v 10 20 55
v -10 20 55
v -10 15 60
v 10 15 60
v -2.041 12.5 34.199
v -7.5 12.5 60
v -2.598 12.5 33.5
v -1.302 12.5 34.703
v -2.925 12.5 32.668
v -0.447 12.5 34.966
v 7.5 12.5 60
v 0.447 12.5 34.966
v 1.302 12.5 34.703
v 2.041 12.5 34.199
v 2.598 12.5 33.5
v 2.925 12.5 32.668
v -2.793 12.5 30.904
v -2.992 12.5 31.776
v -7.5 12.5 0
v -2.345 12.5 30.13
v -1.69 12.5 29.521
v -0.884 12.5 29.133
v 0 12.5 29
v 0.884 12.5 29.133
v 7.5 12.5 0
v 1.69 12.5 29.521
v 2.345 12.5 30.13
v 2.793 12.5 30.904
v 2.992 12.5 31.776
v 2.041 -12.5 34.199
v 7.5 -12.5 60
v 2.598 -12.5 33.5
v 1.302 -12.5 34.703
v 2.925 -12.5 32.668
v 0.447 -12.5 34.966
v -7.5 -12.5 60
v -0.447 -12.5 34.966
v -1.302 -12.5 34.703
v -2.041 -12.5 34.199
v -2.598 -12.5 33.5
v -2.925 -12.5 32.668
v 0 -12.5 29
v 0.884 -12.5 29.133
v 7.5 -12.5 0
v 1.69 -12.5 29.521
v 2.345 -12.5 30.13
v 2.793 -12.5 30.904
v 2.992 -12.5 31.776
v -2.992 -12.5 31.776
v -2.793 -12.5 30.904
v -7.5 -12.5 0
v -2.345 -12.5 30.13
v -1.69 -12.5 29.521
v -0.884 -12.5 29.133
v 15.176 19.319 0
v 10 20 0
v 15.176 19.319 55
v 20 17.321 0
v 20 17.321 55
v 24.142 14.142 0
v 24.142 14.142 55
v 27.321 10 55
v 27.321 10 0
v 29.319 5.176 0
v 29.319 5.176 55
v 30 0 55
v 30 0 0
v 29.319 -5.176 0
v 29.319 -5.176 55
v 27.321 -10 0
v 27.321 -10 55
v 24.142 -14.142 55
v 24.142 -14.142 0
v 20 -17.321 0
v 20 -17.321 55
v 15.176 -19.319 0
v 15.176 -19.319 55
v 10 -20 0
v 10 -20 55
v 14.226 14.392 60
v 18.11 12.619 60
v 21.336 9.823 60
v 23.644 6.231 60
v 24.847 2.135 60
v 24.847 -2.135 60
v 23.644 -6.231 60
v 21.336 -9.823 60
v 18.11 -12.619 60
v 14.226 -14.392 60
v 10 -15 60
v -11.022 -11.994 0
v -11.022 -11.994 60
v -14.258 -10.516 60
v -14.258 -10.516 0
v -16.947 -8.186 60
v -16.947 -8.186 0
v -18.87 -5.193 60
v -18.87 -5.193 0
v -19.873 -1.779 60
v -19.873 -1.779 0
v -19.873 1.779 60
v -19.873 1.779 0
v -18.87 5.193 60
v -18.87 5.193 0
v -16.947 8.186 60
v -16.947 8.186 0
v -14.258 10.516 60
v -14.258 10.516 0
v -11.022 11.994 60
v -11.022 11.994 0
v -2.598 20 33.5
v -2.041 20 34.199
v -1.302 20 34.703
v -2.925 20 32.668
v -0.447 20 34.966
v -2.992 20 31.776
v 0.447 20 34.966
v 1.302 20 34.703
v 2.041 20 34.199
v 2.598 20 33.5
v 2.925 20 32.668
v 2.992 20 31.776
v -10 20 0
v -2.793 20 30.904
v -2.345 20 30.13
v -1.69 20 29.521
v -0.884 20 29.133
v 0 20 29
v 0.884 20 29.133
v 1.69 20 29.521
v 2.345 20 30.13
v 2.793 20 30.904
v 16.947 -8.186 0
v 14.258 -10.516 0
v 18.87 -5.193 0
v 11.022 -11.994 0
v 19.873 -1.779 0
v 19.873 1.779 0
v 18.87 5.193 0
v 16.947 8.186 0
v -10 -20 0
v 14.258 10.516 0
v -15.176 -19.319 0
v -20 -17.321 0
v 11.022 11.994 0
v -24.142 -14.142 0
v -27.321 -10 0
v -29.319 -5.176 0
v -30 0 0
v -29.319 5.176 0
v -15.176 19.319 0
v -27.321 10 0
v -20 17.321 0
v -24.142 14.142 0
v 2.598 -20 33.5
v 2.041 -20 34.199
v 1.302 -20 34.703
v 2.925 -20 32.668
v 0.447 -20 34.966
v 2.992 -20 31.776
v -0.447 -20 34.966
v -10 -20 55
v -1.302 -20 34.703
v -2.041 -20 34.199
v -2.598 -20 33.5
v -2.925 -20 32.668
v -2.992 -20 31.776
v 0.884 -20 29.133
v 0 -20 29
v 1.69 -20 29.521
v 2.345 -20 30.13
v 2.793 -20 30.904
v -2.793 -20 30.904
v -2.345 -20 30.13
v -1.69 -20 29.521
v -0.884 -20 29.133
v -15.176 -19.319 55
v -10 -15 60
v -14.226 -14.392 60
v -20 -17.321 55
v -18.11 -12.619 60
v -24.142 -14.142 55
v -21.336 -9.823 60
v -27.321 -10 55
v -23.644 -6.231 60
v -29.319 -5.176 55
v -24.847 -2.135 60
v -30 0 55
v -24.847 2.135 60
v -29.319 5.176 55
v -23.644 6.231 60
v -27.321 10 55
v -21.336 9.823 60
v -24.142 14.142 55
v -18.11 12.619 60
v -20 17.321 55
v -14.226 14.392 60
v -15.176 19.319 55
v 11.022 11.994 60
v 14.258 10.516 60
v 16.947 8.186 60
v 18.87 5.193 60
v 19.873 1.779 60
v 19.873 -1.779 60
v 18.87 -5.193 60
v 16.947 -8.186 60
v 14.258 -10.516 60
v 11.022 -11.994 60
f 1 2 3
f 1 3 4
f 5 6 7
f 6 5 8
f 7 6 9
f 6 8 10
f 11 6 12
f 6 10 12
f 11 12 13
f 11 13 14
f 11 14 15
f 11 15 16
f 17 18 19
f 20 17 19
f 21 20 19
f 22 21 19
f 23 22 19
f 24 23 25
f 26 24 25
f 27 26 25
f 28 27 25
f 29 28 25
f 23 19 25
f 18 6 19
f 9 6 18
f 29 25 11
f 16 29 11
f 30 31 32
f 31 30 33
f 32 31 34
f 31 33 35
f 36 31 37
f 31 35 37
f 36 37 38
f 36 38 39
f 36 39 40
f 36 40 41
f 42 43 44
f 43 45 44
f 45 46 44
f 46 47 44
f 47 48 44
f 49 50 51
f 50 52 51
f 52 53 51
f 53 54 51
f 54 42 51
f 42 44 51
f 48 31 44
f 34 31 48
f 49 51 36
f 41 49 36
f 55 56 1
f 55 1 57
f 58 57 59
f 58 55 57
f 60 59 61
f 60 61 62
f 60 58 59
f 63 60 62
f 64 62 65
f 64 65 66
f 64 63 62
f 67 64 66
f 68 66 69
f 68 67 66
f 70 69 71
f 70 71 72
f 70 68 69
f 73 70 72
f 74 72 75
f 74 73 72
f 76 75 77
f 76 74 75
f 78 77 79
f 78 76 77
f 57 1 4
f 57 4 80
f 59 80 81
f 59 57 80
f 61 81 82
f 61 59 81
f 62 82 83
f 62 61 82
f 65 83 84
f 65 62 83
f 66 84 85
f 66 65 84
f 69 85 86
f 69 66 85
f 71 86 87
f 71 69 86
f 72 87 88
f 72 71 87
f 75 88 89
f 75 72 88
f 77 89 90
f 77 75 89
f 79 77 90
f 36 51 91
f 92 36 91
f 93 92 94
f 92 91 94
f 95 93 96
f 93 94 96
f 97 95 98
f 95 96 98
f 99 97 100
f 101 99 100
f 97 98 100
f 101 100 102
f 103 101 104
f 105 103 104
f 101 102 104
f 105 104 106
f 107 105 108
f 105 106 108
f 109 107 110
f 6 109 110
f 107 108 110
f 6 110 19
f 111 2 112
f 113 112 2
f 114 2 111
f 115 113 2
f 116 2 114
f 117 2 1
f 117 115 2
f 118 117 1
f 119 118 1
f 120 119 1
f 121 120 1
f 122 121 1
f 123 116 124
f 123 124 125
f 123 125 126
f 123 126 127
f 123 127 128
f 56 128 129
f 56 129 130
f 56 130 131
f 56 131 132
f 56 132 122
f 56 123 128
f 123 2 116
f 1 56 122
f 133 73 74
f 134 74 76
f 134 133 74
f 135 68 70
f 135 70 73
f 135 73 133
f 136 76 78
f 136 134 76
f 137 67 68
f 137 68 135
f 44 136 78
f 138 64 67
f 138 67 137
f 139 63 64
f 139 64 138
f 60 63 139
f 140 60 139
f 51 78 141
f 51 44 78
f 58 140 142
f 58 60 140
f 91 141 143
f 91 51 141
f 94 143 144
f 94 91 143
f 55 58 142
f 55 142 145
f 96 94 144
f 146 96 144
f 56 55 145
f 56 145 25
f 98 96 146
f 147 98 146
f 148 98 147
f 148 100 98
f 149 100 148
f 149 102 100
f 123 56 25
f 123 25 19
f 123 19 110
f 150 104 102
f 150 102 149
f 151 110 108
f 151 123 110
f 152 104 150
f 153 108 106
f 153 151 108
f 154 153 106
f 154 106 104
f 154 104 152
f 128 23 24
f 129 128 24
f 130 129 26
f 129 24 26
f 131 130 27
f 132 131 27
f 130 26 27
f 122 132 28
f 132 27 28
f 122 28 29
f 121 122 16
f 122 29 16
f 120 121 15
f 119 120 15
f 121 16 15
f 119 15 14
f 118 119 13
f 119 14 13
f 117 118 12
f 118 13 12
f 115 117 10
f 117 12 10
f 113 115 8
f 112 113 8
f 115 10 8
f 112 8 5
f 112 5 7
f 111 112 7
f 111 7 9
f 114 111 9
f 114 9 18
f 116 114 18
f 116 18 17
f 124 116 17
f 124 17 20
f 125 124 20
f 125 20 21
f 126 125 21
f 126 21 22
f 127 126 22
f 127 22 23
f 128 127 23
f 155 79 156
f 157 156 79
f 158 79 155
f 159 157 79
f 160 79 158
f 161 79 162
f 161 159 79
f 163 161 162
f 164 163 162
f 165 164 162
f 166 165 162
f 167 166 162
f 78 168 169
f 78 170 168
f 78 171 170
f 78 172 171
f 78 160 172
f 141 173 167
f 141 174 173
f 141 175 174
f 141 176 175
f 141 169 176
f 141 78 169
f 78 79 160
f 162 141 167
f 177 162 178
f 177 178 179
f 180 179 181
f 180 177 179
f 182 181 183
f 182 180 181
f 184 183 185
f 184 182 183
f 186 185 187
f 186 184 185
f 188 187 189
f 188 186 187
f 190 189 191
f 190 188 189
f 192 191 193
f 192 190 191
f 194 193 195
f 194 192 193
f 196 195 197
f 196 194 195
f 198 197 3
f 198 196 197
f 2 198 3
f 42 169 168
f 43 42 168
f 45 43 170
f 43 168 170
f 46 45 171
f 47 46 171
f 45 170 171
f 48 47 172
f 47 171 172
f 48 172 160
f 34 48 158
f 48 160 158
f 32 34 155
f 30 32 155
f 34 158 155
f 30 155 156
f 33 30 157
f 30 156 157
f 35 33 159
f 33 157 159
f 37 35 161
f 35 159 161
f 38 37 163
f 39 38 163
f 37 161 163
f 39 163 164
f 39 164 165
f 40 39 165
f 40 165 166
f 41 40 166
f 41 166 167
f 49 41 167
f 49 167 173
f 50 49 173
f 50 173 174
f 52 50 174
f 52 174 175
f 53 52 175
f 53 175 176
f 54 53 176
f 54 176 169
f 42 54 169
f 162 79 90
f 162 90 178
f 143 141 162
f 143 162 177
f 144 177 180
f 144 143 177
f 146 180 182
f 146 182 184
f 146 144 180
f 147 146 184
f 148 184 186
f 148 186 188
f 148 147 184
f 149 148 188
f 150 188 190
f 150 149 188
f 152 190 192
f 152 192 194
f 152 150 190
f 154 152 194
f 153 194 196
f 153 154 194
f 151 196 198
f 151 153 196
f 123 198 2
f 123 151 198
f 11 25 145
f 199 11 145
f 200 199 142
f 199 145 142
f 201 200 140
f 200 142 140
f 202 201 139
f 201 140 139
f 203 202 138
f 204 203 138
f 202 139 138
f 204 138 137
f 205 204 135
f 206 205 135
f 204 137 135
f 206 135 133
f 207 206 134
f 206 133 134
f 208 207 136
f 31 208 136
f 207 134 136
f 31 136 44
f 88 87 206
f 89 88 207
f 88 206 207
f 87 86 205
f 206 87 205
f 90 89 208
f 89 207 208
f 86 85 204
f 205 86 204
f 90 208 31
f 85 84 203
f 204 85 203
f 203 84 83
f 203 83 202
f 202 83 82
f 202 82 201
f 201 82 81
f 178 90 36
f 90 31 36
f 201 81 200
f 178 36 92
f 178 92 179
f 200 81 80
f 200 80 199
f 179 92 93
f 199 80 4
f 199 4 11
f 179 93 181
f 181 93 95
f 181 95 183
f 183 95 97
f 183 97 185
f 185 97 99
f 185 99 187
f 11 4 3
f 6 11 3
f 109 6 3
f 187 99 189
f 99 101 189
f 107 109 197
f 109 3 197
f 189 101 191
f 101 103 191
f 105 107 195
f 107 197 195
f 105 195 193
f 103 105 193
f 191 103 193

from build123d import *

# Parameters (mm, degrees)
BOSS_EXTRUDE1_DEPTH = 60
SKETCH4_R           = 3
CUT_EXTRUDE1_DEPTH  = 60
CHAMFER1_SIZE       = 5


with BuildPart() as part:
    # Sketch1 → Boss-Extrude1 (new body)
    with BuildSketch(Plane.XY):
        with BuildLine():
            Line((-10, 20), (10, 20))
            ThreePointArc((10, 20), (30, 0), (10, -20))
            Line((10, -20), (-10, -20))
            ThreePointArc((-10, -20), (-30, 0), (-10, 20))
        make_face()
        with BuildLine():
            Line((-7.5, 12.5), (7.5, 12.5))
            ThreePointArc((7.5, 12.5), (20, 0), (7.5, -12.5))
            Line((7.5, -12.5), (-7.5, -12.5))
            ThreePointArc((-7.5, -12.5), (-20, 0), (-7.5, 12.5))
        make_face(mode=Mode.SUBTRACT)
    extrude(amount=BOSS_EXTRUDE1_DEPTH)

    # Sketch4 → Cut-Extrude1 (cut)
    with BuildSketch(Plane.XZ.offset(20)):
        with Locations(Location((0, 32, 0), (0, 0, 270))):  # turned: the seam where the file's is
            Circle(SKETCH4_R)
    extrude(amount=-CUT_EXTRUDE1_DEPTH, mode=Mode.SUBTRACT)

    # Chamfer1
    chamfer1_edges = [part.edges().sort_by_distance(p)[0] for p in [
        (30, 0, 60),
        (0, 20, 60),
        (-30, 0, 60),
        (0, -20, 60),
    ]]
    chamfer(chamfer1_edges, length=CHAMFER1_SIZE)


solid = part.part
